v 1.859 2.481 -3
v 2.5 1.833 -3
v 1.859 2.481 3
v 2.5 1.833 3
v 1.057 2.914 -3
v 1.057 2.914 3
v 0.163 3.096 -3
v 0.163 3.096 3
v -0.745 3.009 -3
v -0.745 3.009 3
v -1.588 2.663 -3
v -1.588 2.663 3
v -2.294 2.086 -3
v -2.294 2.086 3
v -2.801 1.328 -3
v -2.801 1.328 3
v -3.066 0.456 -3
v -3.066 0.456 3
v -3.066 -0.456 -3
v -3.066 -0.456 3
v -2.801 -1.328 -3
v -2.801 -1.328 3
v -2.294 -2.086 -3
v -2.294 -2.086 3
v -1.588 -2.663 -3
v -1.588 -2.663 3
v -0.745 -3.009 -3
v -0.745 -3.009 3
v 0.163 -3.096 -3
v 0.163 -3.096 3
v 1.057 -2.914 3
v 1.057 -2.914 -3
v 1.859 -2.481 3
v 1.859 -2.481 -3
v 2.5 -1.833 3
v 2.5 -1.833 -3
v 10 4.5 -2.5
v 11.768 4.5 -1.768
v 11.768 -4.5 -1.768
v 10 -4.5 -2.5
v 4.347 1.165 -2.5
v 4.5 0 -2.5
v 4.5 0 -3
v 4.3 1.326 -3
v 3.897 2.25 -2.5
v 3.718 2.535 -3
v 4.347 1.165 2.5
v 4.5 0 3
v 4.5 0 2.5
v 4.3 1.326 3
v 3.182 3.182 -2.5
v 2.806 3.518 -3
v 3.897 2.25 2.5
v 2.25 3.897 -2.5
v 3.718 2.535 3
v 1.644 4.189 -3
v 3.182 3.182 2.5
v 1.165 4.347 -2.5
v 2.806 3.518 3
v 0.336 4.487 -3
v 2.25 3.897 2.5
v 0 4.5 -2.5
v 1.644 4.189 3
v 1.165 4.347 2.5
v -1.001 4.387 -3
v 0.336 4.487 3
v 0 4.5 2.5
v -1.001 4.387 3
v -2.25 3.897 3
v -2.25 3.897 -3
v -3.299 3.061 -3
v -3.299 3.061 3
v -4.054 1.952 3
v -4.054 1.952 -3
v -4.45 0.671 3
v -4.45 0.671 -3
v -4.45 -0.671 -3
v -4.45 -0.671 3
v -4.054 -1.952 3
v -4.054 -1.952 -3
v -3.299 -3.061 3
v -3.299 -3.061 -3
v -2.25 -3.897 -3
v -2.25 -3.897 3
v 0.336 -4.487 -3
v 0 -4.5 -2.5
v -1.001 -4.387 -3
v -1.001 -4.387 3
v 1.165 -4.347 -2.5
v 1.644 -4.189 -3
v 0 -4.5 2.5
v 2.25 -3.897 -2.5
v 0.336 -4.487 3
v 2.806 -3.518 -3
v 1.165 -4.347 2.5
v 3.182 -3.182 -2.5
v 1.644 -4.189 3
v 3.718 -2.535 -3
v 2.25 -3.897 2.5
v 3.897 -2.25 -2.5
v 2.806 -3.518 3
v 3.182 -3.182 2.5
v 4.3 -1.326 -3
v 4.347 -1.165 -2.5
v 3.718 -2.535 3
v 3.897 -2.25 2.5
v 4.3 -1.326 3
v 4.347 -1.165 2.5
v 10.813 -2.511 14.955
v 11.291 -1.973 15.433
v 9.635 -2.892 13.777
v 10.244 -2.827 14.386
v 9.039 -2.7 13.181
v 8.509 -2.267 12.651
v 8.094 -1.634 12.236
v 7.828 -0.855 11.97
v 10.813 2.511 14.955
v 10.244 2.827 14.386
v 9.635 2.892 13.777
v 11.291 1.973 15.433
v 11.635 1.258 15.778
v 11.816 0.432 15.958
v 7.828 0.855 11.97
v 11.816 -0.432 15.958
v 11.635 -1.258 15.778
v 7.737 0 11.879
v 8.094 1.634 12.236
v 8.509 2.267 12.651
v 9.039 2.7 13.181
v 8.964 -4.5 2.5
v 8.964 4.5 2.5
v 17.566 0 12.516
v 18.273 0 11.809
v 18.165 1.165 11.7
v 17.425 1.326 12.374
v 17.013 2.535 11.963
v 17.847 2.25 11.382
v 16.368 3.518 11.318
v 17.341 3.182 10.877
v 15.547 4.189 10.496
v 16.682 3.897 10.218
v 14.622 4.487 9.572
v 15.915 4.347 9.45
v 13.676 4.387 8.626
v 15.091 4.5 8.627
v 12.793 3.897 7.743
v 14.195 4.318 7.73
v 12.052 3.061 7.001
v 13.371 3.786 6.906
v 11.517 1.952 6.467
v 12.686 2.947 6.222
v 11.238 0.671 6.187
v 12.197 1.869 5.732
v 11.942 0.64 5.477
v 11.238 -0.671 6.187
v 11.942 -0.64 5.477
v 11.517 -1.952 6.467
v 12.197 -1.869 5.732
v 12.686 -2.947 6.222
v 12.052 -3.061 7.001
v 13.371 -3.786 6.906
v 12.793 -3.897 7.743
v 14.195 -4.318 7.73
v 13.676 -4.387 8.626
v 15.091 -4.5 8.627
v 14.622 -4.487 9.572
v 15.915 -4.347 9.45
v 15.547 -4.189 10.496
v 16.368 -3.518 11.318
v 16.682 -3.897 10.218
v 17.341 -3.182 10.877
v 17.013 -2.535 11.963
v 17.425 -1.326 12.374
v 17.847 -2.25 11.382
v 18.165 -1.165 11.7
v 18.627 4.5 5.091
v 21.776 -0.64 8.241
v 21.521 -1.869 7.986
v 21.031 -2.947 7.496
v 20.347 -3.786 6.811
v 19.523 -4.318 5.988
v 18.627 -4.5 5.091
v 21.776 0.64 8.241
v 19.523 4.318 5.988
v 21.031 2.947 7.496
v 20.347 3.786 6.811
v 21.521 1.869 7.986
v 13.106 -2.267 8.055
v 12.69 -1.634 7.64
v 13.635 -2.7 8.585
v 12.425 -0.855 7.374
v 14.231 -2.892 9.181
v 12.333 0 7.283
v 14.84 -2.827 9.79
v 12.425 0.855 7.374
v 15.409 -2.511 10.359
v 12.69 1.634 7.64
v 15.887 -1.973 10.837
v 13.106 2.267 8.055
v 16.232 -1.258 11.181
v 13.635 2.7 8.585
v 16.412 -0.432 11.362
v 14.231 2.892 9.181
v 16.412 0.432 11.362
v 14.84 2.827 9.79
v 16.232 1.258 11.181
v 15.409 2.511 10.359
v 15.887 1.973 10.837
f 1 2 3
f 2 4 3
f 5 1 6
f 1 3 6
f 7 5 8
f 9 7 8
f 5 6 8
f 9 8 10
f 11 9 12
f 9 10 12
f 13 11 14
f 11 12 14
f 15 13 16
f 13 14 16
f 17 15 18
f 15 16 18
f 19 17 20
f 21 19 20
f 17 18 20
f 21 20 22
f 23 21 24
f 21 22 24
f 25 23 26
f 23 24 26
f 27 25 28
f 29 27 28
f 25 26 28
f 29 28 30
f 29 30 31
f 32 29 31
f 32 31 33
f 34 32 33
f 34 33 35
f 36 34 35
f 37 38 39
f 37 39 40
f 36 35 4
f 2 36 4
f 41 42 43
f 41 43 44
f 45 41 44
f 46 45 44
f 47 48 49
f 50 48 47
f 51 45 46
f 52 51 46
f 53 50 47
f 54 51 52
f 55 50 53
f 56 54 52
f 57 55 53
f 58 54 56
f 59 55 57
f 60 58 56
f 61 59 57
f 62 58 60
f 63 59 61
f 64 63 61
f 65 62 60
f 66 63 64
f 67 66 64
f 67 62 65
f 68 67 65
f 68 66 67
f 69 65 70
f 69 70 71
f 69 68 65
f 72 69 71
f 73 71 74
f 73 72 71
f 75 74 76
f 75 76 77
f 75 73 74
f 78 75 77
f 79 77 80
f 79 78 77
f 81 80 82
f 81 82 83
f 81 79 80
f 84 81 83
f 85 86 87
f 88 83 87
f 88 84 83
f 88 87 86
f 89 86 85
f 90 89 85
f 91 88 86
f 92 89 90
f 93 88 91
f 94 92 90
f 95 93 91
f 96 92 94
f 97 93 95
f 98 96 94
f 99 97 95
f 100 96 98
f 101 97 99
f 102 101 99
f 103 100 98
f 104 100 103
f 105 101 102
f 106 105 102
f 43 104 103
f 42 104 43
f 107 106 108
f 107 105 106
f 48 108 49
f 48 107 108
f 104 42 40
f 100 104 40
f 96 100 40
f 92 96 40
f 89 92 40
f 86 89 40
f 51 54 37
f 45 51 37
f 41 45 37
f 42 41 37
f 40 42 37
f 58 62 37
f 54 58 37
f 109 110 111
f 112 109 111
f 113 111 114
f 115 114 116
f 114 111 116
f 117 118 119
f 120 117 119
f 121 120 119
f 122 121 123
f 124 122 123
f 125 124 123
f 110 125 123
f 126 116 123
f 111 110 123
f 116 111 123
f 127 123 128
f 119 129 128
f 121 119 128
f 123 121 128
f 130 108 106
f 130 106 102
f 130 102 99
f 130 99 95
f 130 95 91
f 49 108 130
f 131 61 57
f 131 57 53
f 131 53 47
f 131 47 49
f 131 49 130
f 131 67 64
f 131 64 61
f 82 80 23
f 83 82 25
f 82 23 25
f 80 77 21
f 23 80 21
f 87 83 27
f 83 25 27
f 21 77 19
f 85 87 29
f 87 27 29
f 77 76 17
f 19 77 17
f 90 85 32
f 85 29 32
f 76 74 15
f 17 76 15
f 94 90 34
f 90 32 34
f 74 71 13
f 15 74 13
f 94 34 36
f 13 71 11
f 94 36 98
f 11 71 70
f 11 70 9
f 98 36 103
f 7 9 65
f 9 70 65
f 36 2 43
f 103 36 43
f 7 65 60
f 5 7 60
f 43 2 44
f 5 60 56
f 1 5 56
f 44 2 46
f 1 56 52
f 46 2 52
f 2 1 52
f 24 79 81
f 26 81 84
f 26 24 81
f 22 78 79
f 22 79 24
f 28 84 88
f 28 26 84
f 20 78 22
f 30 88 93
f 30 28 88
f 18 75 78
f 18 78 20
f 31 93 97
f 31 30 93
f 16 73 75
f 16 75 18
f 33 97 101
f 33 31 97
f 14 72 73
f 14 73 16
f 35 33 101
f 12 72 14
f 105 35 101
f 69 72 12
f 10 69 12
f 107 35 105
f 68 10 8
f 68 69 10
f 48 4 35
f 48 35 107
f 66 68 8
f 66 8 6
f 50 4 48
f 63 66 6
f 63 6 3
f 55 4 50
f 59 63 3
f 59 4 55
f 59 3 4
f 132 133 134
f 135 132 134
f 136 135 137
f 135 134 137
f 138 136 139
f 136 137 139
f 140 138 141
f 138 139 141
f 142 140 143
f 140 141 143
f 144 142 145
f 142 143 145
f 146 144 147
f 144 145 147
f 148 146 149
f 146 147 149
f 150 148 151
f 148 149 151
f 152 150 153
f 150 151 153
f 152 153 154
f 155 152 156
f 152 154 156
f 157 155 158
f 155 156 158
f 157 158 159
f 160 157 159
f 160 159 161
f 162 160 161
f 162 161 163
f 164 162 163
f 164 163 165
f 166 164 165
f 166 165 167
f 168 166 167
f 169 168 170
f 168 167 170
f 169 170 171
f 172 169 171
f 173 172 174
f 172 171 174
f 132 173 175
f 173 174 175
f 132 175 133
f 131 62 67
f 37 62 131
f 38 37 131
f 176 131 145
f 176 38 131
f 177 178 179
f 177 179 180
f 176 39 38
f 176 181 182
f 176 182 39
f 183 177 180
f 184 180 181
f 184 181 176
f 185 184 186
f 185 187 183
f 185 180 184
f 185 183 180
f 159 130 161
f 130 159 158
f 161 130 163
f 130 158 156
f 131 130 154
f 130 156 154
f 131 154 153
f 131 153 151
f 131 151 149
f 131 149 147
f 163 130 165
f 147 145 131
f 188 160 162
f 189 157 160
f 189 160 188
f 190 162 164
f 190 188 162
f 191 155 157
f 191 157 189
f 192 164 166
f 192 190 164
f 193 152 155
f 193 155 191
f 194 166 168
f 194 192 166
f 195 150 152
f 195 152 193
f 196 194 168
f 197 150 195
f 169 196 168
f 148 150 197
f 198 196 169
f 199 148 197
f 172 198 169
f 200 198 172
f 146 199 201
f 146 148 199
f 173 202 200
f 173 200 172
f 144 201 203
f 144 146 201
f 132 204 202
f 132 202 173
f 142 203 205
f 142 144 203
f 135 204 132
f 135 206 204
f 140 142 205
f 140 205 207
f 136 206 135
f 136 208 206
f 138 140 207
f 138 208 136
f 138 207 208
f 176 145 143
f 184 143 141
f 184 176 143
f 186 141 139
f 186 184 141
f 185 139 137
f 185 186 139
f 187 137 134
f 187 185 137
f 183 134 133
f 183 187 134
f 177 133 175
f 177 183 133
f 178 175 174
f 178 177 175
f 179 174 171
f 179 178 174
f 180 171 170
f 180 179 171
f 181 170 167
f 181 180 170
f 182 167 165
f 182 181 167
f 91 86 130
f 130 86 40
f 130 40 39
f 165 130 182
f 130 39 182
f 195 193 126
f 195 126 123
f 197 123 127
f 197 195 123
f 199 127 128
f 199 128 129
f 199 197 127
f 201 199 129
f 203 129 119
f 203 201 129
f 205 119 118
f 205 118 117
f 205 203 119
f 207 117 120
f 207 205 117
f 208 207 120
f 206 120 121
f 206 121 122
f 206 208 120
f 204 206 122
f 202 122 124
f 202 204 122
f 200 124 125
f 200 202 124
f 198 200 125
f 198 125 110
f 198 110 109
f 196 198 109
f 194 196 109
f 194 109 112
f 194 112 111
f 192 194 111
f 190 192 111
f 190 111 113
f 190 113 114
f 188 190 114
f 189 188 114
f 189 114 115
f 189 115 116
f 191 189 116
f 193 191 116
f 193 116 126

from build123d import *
from build123d.topology import SkipClean

# Parameters (mm, degrees)
SKETCH_1_R      = 4.5
EXTRUDE_1_DEPTH = 3
EXTRUDE_2_DEPTH = 2.5
EXTRUDE_3_DEPTH = 2.5
LOFT_START      = -4.5
LOFT_1_DEPTH    = 9
SKETCH_4_R      = 2.9
EXTRUDE_5_DEPTH = 10
SKETCH_5_R      = 4.5
EXTRUDE_6_DEPTH = 1


# Read off the part's stored shape, not the designer's step: 放样1
with BuildPart() as part:
    # 草图1 → 凸台-拉伸1 (new, symmetric)
    with BuildSketch(Plane.XY):
        Circle(SKETCH_1_R)
        with BuildLine():
            Line((2.5, -1.833030278), (2.5, 1.833030278))
            ThreePointArc((2.5, 1.833030278), (-3.1, 0), (2.5, -1.833030278))
        make_face(mode=Mode.SUBTRACT)
    extrude(amount=EXTRUDE_1_DEPTH, both=True)

    # 草图2 → 凸台-拉伸2 (add, symmetric)
    with BuildSketch(Plane.XY):
        with BuildLine():
            ThreePointArc((4.5, 0), (3.181980515, -3.181980515), (0, -4.5))
            Line((0, -4.5), (10, -4.5))
            Line((10, -4.5), (10, 4.5))
            Line((10, 4.5), (0, 4.5))
            ThreePointArc((0, 4.5), (3.181980515, 3.181980515), (4.5, 0))
        make_face()
    extrude(amount=EXTRUDE_2_DEPTH, both=True)

    # 草图3 → 凸台-拉伸3 (add, symmetric)
    with BuildSketch(Plane(origin=(5, 0, -5), x_dir=(0, 1, 0), z_dir=(0.7071067811865438, 0, -0.7071067811865512))):
        with BuildLine():
            Line((-4.5, 7.071067812), (4.5, 7.071067812))
            Line((4.5, 7.071067812), (4.5, 16.771067812))
            ThreePointArc((4.5, 16.771067812), (0, 21.271067812), (-4.5, 16.771067812))
            Line((-4.5, 16.771067812), (-4.5, 7.071067812))
        make_face()
    extrude(amount=EXTRUDE_3_DEPTH, both=True)

    # 放样1 outline → 放样1 (add)
    with BuildSketch(Plane(origin=(0, 0, 0), x_dir=(1, 0, 0), z_dir=(0, 1, 0)).offset(LOFT_START)):
        Polygon((10, 0), (11.767766953, 1.767766953), (10, 2.5), align=None)
    extrude(amount=LOFT_1_DEPTH)

    # 草图4 → 凸台-拉伸5 (add)
    with BuildSketch(Plane(origin=(5, 0, -5), x_dir=(0, 1, 0), z_dir=(0.7071067811865438, 0, -0.7071067811865512))):
        with Locations(Location((0, 16.771067812, 0), (0, 0, 270))):
            Circle(SKETCH_4_R)
    extrude(amount=-EXTRUDE_5_DEPTH)

    # 草图5 → 凸台-拉伸6 (add)
    with SkipClean():  # the faces are left unmerged after this step: merging them gives an invalid solid
        with BuildSketch(Plane(origin=(3.232233047, 0, -3.232233047), x_dir=(0.7071067811865512, 0, 0.7071067811865438), z_dir=(-0.7071067811865438, 0, 0.7071067811865512))):
            with Locations((16.771067812, 0)):
                Circle(SKETCH_5_R)
        extrude(amount=EXTRUDE_6_DEPTH)
    add(part.part.scale(1), mode=Mode.REPLACE)  # the faces are merged on a copy


solid = part.part
